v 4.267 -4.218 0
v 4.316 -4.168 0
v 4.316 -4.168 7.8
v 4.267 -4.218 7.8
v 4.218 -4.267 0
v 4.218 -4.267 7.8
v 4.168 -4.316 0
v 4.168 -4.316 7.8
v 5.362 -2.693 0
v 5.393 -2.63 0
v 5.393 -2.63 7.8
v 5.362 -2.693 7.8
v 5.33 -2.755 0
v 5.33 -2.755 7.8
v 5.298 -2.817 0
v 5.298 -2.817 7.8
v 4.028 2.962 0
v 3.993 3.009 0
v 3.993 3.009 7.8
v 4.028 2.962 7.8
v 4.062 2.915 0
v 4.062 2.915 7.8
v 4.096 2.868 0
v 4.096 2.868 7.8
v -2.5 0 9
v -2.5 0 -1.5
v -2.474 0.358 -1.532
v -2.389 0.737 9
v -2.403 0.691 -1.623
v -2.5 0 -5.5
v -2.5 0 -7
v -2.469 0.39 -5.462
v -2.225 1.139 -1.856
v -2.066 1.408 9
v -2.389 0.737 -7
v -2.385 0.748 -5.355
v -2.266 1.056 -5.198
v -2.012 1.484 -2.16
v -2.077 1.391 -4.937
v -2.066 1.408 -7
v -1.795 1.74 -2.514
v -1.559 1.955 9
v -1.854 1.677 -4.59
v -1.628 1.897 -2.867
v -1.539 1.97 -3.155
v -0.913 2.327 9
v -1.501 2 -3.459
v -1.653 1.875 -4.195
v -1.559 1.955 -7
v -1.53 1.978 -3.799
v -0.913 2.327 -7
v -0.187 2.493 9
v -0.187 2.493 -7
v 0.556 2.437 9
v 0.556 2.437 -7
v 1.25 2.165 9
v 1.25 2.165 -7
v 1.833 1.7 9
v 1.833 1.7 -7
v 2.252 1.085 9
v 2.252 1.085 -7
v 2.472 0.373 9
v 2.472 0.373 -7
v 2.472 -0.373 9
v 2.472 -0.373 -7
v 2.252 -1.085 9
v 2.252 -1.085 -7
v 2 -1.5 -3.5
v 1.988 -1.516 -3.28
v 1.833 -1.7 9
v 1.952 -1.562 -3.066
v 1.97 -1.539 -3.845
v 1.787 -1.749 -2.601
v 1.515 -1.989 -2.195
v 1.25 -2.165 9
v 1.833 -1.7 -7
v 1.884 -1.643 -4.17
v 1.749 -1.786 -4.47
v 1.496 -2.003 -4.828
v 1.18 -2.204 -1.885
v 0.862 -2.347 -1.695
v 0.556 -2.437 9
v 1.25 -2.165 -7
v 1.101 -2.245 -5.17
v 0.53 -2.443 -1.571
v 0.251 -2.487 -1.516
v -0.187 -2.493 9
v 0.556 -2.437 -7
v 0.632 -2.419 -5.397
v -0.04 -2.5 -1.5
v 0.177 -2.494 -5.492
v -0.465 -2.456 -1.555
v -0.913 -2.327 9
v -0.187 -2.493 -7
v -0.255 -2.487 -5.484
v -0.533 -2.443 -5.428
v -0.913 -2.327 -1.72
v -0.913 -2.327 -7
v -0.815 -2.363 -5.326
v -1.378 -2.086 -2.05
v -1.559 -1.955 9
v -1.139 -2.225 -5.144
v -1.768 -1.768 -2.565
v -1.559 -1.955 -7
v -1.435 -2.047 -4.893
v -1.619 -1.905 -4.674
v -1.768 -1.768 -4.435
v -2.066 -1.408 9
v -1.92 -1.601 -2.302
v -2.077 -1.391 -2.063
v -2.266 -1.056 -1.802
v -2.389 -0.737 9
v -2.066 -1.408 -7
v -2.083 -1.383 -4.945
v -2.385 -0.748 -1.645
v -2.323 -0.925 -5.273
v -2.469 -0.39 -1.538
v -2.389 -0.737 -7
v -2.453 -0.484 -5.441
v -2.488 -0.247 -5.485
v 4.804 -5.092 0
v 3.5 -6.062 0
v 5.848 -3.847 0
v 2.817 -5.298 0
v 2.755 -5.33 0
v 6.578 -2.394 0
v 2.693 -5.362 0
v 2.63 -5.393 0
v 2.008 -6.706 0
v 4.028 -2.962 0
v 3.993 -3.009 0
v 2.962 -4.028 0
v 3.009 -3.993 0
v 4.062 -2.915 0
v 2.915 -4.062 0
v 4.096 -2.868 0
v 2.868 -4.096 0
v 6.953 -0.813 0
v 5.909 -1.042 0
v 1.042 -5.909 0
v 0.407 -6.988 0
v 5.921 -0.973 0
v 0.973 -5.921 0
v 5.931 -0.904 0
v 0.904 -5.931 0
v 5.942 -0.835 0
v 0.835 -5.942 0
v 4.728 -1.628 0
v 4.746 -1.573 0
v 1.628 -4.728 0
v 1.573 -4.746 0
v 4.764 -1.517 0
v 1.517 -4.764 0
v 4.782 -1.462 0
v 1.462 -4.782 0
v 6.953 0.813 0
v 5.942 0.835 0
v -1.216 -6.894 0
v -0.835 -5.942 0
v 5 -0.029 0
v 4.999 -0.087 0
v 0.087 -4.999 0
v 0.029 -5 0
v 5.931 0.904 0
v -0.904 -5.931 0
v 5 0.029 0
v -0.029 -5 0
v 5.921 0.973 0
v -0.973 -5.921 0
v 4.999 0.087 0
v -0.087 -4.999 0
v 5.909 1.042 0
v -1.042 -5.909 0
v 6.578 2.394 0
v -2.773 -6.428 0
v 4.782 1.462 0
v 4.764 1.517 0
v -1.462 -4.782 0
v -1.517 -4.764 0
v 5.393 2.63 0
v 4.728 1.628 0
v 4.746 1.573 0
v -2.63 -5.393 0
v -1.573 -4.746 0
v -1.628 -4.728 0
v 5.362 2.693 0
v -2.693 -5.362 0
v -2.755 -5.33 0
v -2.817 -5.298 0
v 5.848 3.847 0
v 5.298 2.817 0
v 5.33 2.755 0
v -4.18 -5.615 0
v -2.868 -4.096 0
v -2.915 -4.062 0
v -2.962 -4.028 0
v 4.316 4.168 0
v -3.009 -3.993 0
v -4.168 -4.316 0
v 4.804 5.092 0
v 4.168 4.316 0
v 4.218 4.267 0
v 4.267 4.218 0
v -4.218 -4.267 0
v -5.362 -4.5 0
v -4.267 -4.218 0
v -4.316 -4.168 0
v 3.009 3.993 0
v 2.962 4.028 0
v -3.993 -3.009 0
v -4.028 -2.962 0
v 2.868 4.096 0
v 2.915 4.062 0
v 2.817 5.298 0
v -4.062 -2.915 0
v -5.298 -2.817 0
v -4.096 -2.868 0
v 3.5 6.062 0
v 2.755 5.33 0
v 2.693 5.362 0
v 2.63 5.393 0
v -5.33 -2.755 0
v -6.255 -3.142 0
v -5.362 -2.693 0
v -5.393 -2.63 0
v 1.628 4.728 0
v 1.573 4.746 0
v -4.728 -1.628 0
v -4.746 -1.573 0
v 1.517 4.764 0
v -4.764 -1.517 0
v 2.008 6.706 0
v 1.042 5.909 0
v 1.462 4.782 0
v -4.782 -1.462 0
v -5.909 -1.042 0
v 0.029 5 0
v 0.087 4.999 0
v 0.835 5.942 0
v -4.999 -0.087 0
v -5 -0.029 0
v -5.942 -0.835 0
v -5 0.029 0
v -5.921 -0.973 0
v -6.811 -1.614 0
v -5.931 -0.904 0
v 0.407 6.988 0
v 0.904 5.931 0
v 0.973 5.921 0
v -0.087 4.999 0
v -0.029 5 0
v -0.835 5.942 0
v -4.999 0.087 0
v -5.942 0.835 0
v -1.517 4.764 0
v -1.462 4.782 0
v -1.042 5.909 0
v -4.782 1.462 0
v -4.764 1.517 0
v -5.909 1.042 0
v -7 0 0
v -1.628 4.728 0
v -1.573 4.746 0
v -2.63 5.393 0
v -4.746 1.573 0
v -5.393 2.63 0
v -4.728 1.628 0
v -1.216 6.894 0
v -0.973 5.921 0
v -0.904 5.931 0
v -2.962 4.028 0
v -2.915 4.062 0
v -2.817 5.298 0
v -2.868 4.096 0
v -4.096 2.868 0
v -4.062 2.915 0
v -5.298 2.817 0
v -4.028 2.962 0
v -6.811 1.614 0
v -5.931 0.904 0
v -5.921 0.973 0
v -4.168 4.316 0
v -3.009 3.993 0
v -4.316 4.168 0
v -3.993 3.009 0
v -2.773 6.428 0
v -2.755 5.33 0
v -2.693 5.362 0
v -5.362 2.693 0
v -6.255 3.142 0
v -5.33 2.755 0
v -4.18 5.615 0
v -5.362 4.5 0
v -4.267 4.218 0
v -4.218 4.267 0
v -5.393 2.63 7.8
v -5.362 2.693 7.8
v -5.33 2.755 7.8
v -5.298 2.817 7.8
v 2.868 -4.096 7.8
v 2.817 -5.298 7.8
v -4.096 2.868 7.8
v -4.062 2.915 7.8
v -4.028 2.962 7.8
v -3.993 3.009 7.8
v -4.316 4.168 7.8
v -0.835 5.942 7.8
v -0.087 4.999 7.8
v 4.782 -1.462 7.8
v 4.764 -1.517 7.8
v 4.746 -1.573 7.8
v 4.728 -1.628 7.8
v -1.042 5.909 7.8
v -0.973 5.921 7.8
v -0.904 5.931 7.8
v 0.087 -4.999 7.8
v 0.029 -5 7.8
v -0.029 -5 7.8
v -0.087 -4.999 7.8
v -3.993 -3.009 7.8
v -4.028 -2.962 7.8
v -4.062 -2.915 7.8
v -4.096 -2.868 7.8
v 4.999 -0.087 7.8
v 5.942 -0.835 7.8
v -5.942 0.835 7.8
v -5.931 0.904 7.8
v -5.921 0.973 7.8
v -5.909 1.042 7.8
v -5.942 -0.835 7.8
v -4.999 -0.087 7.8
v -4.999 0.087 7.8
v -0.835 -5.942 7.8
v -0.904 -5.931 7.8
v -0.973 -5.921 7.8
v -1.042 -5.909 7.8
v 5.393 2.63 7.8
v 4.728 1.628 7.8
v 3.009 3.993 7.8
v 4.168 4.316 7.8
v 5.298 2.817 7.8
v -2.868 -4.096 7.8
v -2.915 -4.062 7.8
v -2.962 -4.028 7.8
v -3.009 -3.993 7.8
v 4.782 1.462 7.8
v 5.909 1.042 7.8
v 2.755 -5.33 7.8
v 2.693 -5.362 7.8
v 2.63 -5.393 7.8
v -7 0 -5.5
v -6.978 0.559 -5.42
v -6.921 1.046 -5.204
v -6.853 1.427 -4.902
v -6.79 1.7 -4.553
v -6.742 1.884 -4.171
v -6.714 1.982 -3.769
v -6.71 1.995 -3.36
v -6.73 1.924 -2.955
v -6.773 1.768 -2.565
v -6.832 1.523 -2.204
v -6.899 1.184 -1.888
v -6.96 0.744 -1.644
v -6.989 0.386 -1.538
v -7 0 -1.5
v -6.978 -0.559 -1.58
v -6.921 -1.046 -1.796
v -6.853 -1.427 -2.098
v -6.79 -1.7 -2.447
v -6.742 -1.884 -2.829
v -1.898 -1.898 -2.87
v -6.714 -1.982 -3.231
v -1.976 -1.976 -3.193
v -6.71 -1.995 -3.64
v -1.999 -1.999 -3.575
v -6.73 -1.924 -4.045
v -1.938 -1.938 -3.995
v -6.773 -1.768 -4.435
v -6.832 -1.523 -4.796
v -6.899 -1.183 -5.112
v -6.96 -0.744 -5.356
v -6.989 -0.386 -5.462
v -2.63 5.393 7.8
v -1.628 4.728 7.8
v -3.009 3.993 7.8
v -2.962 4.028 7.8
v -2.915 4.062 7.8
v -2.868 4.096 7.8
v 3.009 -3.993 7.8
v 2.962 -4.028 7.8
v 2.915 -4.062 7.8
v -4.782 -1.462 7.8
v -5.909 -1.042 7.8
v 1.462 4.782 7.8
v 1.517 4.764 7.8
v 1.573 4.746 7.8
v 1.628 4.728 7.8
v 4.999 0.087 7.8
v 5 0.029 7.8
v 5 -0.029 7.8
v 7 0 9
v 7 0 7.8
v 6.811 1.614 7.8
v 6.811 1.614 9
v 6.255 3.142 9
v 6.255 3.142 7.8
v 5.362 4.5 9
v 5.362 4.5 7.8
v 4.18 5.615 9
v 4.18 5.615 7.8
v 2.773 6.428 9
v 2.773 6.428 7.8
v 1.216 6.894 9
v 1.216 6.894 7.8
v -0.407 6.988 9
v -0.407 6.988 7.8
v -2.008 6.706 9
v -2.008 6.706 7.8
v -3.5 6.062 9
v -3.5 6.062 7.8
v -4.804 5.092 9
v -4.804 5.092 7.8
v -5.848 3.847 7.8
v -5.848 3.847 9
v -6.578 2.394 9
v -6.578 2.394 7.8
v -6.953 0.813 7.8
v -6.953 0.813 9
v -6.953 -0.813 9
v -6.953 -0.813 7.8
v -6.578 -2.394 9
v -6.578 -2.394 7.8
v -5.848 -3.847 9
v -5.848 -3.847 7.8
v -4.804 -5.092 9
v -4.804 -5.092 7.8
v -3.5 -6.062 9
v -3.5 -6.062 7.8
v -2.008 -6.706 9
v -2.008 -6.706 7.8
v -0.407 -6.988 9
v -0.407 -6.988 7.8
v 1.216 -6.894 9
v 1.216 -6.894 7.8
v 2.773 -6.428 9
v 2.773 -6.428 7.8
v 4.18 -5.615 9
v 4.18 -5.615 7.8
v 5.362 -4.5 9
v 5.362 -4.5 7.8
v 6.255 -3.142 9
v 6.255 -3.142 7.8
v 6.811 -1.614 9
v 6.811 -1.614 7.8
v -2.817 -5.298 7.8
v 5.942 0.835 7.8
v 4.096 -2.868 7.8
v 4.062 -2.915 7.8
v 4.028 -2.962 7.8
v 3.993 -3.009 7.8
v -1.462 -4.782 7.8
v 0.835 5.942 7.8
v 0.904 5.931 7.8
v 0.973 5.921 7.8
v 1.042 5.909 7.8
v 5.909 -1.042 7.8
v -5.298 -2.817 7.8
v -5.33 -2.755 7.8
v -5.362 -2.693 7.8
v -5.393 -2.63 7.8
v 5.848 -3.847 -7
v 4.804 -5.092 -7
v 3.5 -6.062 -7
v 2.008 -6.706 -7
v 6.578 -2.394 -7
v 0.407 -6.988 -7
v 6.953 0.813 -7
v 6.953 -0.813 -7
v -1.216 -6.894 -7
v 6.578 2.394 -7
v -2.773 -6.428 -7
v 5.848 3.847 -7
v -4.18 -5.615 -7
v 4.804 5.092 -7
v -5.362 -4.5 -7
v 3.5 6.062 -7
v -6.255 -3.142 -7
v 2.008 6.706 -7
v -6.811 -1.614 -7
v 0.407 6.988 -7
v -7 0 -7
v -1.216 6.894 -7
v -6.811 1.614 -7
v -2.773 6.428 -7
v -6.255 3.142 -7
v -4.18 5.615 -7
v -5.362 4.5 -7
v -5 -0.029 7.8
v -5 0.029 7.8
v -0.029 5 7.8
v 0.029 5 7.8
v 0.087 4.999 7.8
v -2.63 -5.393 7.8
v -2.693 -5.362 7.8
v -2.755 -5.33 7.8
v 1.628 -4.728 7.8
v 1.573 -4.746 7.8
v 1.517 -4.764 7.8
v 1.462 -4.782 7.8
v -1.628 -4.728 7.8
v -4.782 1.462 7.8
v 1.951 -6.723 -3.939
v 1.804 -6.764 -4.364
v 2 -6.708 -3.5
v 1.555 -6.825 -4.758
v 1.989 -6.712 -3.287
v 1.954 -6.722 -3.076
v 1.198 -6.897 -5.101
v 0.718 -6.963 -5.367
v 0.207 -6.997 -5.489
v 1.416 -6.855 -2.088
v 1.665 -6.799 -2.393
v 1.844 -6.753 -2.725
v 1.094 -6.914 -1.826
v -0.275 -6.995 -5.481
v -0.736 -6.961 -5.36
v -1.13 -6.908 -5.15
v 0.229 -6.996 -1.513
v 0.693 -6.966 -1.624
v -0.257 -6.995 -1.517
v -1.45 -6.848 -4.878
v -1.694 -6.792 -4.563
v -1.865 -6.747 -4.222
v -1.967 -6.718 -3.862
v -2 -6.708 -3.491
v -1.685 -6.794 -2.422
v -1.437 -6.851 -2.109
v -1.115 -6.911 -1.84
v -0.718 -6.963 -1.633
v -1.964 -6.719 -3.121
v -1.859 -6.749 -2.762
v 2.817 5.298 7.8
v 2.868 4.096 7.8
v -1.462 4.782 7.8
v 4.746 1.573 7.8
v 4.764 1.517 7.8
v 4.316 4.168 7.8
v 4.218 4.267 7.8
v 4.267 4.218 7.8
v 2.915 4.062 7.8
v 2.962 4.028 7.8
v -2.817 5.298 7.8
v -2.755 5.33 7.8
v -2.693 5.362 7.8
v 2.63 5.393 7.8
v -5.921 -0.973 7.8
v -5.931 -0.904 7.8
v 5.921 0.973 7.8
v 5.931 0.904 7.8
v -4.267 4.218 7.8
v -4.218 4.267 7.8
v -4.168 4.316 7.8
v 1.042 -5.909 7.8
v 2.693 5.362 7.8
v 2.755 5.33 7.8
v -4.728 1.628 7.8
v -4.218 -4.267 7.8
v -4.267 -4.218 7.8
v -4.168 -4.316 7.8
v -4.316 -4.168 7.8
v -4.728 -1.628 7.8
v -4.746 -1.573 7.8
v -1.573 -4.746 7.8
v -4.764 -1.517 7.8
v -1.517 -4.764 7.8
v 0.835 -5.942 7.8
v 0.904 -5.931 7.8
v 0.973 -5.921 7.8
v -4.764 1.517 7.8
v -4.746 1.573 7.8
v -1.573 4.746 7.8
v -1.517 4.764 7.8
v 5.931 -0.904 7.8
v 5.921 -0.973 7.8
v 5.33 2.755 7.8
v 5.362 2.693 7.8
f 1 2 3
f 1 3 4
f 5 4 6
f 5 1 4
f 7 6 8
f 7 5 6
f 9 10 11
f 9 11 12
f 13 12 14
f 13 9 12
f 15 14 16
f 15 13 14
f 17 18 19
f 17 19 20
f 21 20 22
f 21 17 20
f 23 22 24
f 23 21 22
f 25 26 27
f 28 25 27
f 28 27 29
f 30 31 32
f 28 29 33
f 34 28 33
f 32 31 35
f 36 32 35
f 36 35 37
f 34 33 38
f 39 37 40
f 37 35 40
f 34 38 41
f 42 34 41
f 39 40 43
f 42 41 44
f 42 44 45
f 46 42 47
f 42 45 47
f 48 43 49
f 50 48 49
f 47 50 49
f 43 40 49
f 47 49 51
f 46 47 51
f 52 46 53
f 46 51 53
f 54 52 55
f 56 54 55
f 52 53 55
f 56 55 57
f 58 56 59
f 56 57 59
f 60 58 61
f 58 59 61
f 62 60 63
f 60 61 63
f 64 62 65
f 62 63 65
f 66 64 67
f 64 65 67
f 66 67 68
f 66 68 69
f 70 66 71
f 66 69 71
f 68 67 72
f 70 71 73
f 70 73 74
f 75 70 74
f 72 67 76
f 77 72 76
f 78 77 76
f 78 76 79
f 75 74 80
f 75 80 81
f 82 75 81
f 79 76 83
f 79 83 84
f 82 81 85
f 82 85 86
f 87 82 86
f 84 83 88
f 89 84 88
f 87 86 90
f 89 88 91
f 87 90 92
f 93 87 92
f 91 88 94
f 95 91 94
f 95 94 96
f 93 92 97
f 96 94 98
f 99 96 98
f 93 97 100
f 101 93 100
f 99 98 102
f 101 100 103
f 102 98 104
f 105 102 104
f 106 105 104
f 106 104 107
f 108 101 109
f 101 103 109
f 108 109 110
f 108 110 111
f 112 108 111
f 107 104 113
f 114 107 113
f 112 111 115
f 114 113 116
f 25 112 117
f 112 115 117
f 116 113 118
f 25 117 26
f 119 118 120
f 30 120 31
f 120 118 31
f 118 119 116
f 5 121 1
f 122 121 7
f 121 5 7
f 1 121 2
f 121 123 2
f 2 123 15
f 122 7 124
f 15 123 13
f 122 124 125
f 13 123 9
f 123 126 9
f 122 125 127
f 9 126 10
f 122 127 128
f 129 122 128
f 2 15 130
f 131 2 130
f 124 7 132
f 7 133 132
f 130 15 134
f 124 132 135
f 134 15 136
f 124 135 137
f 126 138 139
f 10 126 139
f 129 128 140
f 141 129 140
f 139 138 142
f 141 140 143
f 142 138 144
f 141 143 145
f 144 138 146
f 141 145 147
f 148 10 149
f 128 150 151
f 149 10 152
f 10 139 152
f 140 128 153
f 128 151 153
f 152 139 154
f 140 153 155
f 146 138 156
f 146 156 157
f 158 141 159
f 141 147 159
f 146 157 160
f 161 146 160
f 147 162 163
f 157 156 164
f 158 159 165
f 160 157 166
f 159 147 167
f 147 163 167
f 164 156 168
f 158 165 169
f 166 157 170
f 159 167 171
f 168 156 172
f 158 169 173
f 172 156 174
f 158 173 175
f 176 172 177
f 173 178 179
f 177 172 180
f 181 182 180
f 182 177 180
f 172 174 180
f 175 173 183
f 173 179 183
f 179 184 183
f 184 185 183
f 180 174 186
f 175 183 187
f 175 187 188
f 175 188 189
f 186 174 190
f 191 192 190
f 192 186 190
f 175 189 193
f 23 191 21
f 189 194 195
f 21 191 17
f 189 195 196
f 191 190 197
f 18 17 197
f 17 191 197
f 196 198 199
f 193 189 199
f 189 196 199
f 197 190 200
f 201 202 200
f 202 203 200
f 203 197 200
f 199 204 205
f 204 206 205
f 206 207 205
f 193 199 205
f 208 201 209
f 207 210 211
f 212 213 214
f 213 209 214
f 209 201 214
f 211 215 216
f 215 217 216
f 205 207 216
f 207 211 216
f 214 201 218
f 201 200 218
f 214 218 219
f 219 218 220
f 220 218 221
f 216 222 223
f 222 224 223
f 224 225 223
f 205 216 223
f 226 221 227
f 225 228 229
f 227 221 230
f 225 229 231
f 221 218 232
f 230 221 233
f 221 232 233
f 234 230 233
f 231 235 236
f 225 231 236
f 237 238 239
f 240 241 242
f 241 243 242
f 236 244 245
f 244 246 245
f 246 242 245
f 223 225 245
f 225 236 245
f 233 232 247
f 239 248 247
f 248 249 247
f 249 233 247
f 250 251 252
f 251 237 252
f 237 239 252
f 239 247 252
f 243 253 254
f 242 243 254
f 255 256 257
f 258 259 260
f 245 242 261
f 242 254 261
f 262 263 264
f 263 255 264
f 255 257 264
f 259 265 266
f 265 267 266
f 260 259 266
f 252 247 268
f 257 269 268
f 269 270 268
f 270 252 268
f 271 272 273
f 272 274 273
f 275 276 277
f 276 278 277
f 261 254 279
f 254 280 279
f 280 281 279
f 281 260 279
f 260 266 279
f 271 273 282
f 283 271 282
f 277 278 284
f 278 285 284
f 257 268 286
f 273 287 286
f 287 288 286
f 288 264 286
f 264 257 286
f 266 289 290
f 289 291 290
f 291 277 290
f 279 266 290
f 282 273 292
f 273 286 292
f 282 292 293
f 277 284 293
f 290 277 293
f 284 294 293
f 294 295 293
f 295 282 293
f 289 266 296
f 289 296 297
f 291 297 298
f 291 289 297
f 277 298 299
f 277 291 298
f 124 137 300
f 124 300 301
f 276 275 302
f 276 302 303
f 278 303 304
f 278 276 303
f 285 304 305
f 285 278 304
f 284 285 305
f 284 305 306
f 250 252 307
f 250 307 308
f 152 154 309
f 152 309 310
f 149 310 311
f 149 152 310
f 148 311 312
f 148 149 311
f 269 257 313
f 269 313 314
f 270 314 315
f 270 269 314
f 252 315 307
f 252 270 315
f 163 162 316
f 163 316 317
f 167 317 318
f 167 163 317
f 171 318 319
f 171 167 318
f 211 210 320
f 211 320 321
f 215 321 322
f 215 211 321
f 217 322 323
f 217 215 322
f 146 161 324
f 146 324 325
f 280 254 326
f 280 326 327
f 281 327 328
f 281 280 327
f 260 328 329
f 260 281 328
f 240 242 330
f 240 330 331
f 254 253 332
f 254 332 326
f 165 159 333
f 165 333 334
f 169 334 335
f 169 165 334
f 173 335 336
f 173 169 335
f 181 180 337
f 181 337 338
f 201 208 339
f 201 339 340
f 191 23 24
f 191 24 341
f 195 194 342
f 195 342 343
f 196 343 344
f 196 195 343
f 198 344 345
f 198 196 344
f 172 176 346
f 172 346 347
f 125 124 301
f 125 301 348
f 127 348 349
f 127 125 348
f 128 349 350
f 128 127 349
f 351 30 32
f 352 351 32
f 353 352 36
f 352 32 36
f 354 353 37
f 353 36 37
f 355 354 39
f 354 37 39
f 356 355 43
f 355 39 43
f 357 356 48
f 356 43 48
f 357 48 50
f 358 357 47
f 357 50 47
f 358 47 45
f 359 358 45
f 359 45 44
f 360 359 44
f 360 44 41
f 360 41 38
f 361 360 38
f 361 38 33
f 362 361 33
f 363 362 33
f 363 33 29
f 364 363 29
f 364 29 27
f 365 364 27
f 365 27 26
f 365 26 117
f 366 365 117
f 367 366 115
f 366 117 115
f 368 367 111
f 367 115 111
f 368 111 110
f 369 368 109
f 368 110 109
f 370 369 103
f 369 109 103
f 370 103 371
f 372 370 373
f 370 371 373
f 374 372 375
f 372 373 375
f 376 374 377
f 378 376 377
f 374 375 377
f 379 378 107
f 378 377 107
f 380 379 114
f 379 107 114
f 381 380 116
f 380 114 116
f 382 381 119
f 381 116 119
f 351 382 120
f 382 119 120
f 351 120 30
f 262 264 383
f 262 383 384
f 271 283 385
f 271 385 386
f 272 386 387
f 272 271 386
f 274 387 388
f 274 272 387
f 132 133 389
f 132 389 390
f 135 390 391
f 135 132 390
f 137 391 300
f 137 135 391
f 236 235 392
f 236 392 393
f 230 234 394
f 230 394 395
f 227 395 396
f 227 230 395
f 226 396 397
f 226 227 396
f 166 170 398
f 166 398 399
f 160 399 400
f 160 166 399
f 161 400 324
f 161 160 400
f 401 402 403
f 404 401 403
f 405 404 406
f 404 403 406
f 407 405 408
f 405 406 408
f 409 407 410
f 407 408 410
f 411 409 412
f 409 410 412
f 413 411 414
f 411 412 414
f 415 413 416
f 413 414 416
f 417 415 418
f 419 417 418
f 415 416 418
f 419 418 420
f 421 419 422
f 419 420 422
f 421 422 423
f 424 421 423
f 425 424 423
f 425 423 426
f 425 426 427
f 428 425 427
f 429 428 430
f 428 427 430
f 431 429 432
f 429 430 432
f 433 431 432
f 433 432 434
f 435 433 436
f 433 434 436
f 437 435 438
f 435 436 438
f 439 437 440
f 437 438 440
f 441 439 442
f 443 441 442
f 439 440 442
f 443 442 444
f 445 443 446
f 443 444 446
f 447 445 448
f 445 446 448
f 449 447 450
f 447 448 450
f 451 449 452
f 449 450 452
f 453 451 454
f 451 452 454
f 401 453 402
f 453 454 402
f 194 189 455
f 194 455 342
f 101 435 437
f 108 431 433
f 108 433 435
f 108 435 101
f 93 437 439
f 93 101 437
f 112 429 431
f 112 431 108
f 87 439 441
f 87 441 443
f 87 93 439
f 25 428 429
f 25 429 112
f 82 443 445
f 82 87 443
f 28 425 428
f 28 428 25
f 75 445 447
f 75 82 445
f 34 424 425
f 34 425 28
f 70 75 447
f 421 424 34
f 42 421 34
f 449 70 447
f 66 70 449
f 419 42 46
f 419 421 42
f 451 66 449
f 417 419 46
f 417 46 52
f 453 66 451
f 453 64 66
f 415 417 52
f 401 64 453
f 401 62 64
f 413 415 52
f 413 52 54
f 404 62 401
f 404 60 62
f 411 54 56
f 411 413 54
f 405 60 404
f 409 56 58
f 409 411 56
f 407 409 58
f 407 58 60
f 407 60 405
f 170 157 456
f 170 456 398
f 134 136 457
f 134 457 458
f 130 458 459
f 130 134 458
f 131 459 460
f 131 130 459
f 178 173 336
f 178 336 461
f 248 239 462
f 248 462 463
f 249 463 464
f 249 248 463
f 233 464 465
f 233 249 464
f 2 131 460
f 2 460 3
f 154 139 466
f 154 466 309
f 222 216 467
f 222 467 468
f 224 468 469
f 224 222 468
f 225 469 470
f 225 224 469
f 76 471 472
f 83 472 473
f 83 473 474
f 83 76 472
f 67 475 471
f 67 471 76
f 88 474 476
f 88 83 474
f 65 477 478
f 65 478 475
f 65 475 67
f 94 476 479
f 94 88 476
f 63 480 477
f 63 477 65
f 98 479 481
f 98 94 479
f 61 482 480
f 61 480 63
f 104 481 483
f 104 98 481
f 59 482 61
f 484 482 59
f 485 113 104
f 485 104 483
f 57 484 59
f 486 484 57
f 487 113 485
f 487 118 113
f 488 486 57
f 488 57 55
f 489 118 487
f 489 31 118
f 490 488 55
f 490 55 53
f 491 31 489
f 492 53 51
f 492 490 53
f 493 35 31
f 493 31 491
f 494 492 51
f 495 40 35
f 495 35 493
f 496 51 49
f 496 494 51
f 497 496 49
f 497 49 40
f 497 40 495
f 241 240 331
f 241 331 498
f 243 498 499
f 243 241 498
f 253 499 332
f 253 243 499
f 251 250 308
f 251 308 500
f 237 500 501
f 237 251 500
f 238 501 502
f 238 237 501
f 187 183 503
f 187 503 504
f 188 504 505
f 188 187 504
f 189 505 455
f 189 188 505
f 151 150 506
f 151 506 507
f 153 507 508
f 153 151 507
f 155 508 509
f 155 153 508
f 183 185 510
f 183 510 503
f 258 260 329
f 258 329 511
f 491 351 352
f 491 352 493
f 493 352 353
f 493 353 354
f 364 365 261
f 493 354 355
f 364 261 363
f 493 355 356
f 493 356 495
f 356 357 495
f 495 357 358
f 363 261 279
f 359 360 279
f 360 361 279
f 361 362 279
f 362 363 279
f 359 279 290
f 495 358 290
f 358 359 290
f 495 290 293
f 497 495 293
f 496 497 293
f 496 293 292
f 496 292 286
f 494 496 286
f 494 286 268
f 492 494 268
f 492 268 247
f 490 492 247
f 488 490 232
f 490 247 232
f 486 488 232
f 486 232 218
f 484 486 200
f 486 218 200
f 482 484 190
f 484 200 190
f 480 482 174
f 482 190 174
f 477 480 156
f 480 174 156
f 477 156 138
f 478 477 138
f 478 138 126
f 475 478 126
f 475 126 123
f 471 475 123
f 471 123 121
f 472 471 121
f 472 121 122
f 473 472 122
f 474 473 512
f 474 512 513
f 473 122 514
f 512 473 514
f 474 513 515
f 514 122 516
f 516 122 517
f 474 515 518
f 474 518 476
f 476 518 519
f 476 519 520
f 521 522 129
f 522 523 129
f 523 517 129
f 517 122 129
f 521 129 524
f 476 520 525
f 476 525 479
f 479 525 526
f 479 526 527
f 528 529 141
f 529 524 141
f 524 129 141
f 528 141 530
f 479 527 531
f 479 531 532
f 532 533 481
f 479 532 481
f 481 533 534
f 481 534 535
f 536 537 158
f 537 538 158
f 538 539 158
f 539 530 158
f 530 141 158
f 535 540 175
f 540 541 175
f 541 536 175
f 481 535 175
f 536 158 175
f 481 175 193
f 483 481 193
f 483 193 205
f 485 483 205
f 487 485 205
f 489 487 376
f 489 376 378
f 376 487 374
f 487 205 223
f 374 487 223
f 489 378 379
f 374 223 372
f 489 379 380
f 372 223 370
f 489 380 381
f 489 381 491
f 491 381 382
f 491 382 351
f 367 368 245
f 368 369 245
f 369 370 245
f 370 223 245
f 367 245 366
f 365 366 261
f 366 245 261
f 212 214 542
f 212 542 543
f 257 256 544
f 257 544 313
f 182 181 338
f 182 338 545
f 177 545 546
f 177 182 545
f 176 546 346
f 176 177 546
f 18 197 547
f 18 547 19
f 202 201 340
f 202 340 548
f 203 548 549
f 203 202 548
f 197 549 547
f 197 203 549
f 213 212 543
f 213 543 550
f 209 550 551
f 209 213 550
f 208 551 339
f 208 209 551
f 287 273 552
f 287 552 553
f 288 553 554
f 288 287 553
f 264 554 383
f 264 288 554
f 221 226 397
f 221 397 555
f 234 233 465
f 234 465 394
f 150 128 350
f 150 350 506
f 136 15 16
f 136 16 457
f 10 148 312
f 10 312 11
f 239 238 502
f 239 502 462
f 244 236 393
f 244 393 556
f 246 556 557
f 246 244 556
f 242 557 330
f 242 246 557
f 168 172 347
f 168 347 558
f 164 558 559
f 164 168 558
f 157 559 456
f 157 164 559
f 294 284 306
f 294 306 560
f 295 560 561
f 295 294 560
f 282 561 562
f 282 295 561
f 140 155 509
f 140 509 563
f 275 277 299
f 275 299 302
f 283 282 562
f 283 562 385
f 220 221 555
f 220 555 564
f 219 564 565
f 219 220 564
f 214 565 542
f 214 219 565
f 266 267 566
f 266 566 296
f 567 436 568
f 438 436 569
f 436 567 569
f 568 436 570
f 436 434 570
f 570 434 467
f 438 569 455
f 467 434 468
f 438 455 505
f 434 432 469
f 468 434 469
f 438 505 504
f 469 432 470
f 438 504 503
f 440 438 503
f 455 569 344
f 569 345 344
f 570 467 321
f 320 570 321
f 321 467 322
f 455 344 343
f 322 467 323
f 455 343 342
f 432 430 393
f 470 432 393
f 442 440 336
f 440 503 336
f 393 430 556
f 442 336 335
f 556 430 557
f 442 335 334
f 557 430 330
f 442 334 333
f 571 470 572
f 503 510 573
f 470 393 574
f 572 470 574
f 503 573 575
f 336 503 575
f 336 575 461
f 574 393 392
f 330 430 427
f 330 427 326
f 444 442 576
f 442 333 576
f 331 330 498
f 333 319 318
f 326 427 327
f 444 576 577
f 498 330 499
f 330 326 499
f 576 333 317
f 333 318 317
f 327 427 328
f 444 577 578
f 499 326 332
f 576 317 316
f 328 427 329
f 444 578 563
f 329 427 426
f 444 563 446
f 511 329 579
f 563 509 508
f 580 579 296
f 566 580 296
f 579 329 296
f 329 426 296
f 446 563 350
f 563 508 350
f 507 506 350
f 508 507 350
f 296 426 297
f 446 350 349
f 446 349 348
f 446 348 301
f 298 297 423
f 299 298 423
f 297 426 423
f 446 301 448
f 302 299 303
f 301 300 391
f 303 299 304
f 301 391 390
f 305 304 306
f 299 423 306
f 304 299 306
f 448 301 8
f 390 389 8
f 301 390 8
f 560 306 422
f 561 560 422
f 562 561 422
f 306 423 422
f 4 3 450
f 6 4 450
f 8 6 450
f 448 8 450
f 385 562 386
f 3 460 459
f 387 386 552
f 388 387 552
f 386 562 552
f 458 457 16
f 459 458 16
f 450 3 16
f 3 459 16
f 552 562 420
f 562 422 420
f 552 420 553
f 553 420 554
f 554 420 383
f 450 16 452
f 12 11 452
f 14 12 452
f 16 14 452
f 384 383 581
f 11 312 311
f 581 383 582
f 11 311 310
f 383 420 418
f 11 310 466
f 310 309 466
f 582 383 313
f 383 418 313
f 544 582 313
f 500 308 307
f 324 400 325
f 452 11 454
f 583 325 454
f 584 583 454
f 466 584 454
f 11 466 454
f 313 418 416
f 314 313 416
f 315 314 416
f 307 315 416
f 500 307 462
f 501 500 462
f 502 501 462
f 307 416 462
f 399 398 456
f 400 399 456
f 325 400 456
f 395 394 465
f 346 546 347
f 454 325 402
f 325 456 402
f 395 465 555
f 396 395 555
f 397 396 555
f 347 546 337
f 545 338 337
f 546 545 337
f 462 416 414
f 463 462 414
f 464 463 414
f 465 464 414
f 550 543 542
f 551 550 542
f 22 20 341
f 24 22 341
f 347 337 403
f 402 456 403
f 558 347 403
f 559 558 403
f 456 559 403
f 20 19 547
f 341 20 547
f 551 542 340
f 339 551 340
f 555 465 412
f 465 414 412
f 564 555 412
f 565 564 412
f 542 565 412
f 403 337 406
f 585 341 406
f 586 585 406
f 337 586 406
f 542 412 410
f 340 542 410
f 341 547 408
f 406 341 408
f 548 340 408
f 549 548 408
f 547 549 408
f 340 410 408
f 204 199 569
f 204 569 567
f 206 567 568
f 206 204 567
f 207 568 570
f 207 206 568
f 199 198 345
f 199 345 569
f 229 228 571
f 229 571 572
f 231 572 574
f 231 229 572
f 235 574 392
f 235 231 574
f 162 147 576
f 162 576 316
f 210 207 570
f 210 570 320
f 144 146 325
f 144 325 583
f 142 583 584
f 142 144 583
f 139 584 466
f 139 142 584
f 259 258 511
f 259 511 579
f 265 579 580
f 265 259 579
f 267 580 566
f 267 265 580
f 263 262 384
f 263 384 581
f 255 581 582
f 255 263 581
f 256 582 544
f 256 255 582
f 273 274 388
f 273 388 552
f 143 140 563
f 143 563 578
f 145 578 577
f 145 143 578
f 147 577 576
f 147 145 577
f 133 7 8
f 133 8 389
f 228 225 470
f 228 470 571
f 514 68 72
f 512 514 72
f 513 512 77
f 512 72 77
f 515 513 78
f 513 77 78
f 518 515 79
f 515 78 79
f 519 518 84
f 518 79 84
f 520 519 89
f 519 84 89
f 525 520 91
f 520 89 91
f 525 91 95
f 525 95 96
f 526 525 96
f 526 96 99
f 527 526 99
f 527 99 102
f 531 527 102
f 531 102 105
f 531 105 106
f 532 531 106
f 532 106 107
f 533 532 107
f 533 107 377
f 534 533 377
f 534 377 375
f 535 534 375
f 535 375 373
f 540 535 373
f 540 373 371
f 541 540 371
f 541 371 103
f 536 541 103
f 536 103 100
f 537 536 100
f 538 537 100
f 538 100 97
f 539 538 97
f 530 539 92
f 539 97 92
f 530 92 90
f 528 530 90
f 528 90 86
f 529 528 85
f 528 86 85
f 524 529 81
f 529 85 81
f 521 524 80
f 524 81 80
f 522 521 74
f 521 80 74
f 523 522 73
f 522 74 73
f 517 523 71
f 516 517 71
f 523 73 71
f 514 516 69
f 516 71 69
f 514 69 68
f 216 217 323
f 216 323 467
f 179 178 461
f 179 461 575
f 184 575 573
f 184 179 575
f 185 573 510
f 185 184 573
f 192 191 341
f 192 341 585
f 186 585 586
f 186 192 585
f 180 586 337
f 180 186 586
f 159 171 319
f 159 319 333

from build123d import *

# Parameters (mm, degrees)
EXTRUDE_1_DEPTH     = 7.8
SKETCH_2_R          = 7
EXTRUDE_2_DEPTH     = 1.2
SKETCH_3_R          = 7
EXTRUDE_3_DEPTH     = 7
SKETCH_4_R          = 2.5
CUT_EXTRUDE_1_DEPTH = 17
SKETCH_6_R          = 2
CUT_EXTRUDE_2_DEPTH = 8
SKETCH_7_R          = 2
CUT_EXTRUDE_3_DEPTH = 8.0000001


with BuildPart() as part:
    # 草图1 → 凸台-拉伸1 (new body)
    with BuildSketch(Plane.XY):
        with BuildLine():
            Line((4.999238476, -0.087262032), (5.941608412, -0.835038606))
            ThreePointArc((5.941608412, -0.835038606), (5.926130044, -0.93860679), (5.908846518, -1.041889066))
            Line((5.908846518, -1.041889066), (4.78152378, -1.461858524))
            ThreePointArc((4.78152378, -1.461858524), (4.755282581, -1.545084972), (4.727592878, -1.627840772))
            Line((4.727592878, -1.627840772), (5.392764278, -2.630226881))
            ThreePointArc((5.392764278, -2.630226881), (5.346039145, -2.723942998), (5.297685557, -2.816829377))
            Line((5.297685557, -2.816829377), (4.095760221, -2.867882182))
            ThreePointArc((4.095760221, -2.867882182), (4.045084972, -2.938926261), (3.99317755, -3.009075116))
            Line((3.99317755, -3.009075116), (4.316038802, -4.167950223))
            ThreePointArc((4.316038802, -4.167950223), (4.242640687, -4.242640687), (4.167950223, -4.316038802))
            Line((4.167950223, -4.316038802), (3.009075116, -3.99317755))
            ThreePointArc((3.009075116, -3.99317755), (2.938926261, -4.045084972), (2.867882182, -4.095760221))
            Line((2.867882182, -4.095760221), (2.816829377, -5.297685557))
            ThreePointArc((2.816829377, -5.297685557), (2.723942998, -5.346039145), (2.630226881, -5.392764278))
            Line((2.630226881, -5.392764278), (1.627840772, -4.727592878))
            ThreePointArc((1.627840772, -4.727592878), (1.545084972, -4.755282581), (1.461858524, -4.78152378))
            Line((1.461858524, -4.78152378), (1.041889066, -5.908846518))
            ThreePointArc((1.041889066, -5.908846518), (0.93860679, -5.926130044), (0.835038606, -5.941608412))
            Line((0.835038606, -5.941608412), (0.087262032, -4.999238476))
            ThreePointArc((0.087262032, -4.999238476), (0, -5), (-0.087262032, -4.999238476))
            Line((-0.087262032, -4.999238476), (-0.835038606, -5.941608412))
            ThreePointArc((-0.835038606, -5.941608412), (-0.93860679, -5.926130044), (-1.041889066, -5.908846518))
            Line((-1.041889066, -5.908846518), (-1.461858524, -4.78152378))
            ThreePointArc((-1.461858524, -4.78152378), (-1.545084972, -4.755282581), (-1.627840772, -4.727592878))
            Line((-1.627840772, -4.727592878), (-2.630226881, -5.392764278))
            ThreePointArc((-2.630226881, -5.392764278), (-2.723942998, -5.346039145), (-2.816829377, -5.297685557))
            Line((-2.816829377, -5.297685557), (-2.867882182, -4.095760221))
            ThreePointArc((-2.867882182, -4.095760221), (-2.938926261, -4.045084972), (-3.009075116, -3.99317755))
            Line((-3.009075116, -3.99317755), (-4.167950223, -4.316038802))
            ThreePointArc((-4.167950223, -4.316038802), (-4.242640687, -4.242640687), (-4.316038802, -4.167950223))
            Line((-4.316038802, -4.167950223), (-3.99317755, -3.009075116))
            ThreePointArc((-3.99317755, -3.009075116), (-4.045084972, -2.938926261), (-4.095760221, -2.867882182))
            Line((-4.095760221, -2.867882182), (-5.297685557, -2.816829377))
            ThreePointArc((-5.297685557, -2.816829377), (-5.346039145, -2.723942998), (-5.392764278, -2.630226881))
            Line((-5.392764278, -2.630226881), (-4.727592878, -1.627840772))
            ThreePointArc((-4.727592878, -1.627840772), (-4.755282581, -1.545084972), (-4.78152378, -1.461858524))
            Line((-4.78152378, -1.461858524), (-5.908846518, -1.041889066))
            ThreePointArc((-5.908846518, -1.041889066), (-5.926130044, -0.93860679), (-5.941608412, -0.835038606))
            Line((-5.941608412, -0.835038606), (-4.999238476, -0.087262032))
            ThreePointArc((-4.999238476, -0.087262032), (-5, 0), (-4.999238476, 0.087262032))
            Line((-4.999238476, 0.087262032), (-5.941608412, 0.835038606))
            ThreePointArc((-5.941608412, 0.835038606), (-5.926130044, 0.93860679), (-5.908846518, 1.041889066))
            Line((-5.908846518, 1.041889066), (-4.78152378, 1.461858524))
            ThreePointArc((-4.78152378, 1.461858524), (-4.755282581, 1.545084972), (-4.727592878, 1.627840772))
            Line((-4.727592878, 1.627840772), (-5.392764278, 2.630226881))
            ThreePointArc((-5.392764278, 2.630226881), (-5.346039145, 2.723942998), (-5.297685557, 2.816829377))
            Line((-5.297685557, 2.816829377), (-4.095760221, 2.867882182))
            ThreePointArc((-4.095760221, 2.867882182), (-4.045084972, 2.938926261), (-3.99317755, 3.009075116))
            Line((-3.99317755, 3.009075116), (-4.316038802, 4.167950223))
            ThreePointArc((-4.316038802, 4.167950223), (-4.242640687, 4.242640687), (-4.167950223, 4.316038802))
            Line((-4.167950223, 4.316038802), (-3.009075116, 3.99317755))
            ThreePointArc((-3.009075116, 3.99317755), (-2.938926261, 4.045084972), (-2.867882182, 4.095760221))
            Line((-2.867882182, 4.095760221), (-2.816829377, 5.297685557))
            ThreePointArc((-2.816829377, 5.297685557), (-2.723942998, 5.346039145), (-2.630226881, 5.392764278))
            Line((-2.630226881, 5.392764278), (-1.627840772, 4.727592878))
            ThreePointArc((-1.627840772, 4.727592878), (-1.545084972, 4.755282581), (-1.461858524, 4.78152378))
            Line((-1.461858524, 4.78152378), (-1.041889066, 5.908846518))
            ThreePointArc((-1.041889066, 5.908846518), (-0.93860679, 5.926130044), (-0.835038606, 5.941608412))
            Line((-0.835038606, 5.941608412), (-0.087262032, 4.999238476))
            ThreePointArc((-0.087262032, 4.999238476), (0, 5), (0.087262032, 4.999238476))
            Line((0.087262032, 4.999238476), (0.835038606, 5.941608412))
            ThreePointArc((0.835038606, 5.941608412), (0.93860679, 5.926130044), (1.041889066, 5.908846518))
            Line((1.041889066, 5.908846518), (1.461858524, 4.78152378))
            ThreePointArc((1.461858524, 4.78152378), (1.545084972, 4.755282581), (1.627840772, 4.727592878))
            Line((1.627840772, 4.727592878), (2.630226881, 5.392764278))
            ThreePointArc((2.630226881, 5.392764278), (2.723942998, 5.346039145), (2.816829377, 5.297685557))
            Line((2.816829377, 5.297685557), (2.867882182, 4.095760221))
            ThreePointArc((2.867882182, 4.095760221), (2.938926261, 4.045084972), (3.009075116, 3.99317755))
            Line((3.009075116, 3.99317755), (4.167950223, 4.316038802))
            ThreePointArc((4.167950223, 4.316038802), (4.242640687, 4.242640687), (4.316038802, 4.167950223))
            Line((4.316038802, 4.167950223), (3.99317755, 3.009075116))
            ThreePointArc((3.99317755, 3.009075116), (4.045084972, 2.938926261), (4.095760221, 2.867882182))
            Line((4.095760221, 2.867882182), (5.297685557, 2.816829377))
            ThreePointArc((5.297685557, 2.816829377), (5.346039145, 2.723942998), (5.392764278, 2.630226881))
            Line((5.392764278, 2.630226881), (4.727592878, 1.627840772))
            ThreePointArc((4.727592878, 1.627840772), (4.755282581, 1.545084972), (4.78152378, 1.461858524))
            Line((4.78152378, 1.461858524), (5.908846518, 1.041889066))
            ThreePointArc((5.908846518, 1.041889066), (5.926130044, 0.93860679), (5.941608412, 0.835038606))
            Line((5.941608412, 0.835038606), (4.999238476, 0.087262032))
            ThreePointArc((4.999238476, 0.087262032), (5, 0), (4.999238476, -0.087262032))
        make_face()
    extrude(amount=EXTRUDE_1_DEPTH)

    # 草图2 → 凸台-拉伸2 (add)
    with BuildSketch(Plane.XY.offset(7.8)):
        Circle(SKETCH_2_R)
    extrude(amount=EXTRUDE_2_DEPTH)

    # 草图3 → 凸台-拉伸3 (add)
    with BuildSketch(Plane(origin=(0, 0, 0), x_dir=(-1, 0, 0), z_dir=(0, 0, -1))):
        Circle(SKETCH_3_R)
    extrude(amount=EXTRUDE_3_DEPTH)

    # 草图4 → 切除-拉伸1 (cut, through all)
    with BuildSketch(Plane(origin=(0, 0, -7), x_dir=(-1, 0, 0), z_dir=(0, 0, -1))):
        Circle(SKETCH_4_R)
    extrude(amount=-CUT_EXTRUDE_1_DEPTH, mode=Mode.SUBTRACT)

    # 草图6 → 切除-拉伸2 (cut, through all)
    with BuildSketch(Plane(origin=(0, 0, 0), x_dir=(1, 0, 0), z_dir=(0, 1, 0))):
        with Locations((0, 3.5)):
            Circle(SKETCH_6_R)
    extrude(amount=-CUT_EXTRUDE_2_DEPTH, mode=Mode.SUBTRACT)

    # 草图7 → 切除-拉伸3 (cut, through all)
    with BuildSketch(Plane(origin=(0, 0, 0), x_dir=(0, 0, -1), z_dir=(1, 0, 0))):
        with Locations((3.5, 0)):
            Circle(SKETCH_7_R)
    extrude(amount=-CUT_EXTRUDE_3_DEPTH, mode=Mode.SUBTRACT)


solid = part.part
